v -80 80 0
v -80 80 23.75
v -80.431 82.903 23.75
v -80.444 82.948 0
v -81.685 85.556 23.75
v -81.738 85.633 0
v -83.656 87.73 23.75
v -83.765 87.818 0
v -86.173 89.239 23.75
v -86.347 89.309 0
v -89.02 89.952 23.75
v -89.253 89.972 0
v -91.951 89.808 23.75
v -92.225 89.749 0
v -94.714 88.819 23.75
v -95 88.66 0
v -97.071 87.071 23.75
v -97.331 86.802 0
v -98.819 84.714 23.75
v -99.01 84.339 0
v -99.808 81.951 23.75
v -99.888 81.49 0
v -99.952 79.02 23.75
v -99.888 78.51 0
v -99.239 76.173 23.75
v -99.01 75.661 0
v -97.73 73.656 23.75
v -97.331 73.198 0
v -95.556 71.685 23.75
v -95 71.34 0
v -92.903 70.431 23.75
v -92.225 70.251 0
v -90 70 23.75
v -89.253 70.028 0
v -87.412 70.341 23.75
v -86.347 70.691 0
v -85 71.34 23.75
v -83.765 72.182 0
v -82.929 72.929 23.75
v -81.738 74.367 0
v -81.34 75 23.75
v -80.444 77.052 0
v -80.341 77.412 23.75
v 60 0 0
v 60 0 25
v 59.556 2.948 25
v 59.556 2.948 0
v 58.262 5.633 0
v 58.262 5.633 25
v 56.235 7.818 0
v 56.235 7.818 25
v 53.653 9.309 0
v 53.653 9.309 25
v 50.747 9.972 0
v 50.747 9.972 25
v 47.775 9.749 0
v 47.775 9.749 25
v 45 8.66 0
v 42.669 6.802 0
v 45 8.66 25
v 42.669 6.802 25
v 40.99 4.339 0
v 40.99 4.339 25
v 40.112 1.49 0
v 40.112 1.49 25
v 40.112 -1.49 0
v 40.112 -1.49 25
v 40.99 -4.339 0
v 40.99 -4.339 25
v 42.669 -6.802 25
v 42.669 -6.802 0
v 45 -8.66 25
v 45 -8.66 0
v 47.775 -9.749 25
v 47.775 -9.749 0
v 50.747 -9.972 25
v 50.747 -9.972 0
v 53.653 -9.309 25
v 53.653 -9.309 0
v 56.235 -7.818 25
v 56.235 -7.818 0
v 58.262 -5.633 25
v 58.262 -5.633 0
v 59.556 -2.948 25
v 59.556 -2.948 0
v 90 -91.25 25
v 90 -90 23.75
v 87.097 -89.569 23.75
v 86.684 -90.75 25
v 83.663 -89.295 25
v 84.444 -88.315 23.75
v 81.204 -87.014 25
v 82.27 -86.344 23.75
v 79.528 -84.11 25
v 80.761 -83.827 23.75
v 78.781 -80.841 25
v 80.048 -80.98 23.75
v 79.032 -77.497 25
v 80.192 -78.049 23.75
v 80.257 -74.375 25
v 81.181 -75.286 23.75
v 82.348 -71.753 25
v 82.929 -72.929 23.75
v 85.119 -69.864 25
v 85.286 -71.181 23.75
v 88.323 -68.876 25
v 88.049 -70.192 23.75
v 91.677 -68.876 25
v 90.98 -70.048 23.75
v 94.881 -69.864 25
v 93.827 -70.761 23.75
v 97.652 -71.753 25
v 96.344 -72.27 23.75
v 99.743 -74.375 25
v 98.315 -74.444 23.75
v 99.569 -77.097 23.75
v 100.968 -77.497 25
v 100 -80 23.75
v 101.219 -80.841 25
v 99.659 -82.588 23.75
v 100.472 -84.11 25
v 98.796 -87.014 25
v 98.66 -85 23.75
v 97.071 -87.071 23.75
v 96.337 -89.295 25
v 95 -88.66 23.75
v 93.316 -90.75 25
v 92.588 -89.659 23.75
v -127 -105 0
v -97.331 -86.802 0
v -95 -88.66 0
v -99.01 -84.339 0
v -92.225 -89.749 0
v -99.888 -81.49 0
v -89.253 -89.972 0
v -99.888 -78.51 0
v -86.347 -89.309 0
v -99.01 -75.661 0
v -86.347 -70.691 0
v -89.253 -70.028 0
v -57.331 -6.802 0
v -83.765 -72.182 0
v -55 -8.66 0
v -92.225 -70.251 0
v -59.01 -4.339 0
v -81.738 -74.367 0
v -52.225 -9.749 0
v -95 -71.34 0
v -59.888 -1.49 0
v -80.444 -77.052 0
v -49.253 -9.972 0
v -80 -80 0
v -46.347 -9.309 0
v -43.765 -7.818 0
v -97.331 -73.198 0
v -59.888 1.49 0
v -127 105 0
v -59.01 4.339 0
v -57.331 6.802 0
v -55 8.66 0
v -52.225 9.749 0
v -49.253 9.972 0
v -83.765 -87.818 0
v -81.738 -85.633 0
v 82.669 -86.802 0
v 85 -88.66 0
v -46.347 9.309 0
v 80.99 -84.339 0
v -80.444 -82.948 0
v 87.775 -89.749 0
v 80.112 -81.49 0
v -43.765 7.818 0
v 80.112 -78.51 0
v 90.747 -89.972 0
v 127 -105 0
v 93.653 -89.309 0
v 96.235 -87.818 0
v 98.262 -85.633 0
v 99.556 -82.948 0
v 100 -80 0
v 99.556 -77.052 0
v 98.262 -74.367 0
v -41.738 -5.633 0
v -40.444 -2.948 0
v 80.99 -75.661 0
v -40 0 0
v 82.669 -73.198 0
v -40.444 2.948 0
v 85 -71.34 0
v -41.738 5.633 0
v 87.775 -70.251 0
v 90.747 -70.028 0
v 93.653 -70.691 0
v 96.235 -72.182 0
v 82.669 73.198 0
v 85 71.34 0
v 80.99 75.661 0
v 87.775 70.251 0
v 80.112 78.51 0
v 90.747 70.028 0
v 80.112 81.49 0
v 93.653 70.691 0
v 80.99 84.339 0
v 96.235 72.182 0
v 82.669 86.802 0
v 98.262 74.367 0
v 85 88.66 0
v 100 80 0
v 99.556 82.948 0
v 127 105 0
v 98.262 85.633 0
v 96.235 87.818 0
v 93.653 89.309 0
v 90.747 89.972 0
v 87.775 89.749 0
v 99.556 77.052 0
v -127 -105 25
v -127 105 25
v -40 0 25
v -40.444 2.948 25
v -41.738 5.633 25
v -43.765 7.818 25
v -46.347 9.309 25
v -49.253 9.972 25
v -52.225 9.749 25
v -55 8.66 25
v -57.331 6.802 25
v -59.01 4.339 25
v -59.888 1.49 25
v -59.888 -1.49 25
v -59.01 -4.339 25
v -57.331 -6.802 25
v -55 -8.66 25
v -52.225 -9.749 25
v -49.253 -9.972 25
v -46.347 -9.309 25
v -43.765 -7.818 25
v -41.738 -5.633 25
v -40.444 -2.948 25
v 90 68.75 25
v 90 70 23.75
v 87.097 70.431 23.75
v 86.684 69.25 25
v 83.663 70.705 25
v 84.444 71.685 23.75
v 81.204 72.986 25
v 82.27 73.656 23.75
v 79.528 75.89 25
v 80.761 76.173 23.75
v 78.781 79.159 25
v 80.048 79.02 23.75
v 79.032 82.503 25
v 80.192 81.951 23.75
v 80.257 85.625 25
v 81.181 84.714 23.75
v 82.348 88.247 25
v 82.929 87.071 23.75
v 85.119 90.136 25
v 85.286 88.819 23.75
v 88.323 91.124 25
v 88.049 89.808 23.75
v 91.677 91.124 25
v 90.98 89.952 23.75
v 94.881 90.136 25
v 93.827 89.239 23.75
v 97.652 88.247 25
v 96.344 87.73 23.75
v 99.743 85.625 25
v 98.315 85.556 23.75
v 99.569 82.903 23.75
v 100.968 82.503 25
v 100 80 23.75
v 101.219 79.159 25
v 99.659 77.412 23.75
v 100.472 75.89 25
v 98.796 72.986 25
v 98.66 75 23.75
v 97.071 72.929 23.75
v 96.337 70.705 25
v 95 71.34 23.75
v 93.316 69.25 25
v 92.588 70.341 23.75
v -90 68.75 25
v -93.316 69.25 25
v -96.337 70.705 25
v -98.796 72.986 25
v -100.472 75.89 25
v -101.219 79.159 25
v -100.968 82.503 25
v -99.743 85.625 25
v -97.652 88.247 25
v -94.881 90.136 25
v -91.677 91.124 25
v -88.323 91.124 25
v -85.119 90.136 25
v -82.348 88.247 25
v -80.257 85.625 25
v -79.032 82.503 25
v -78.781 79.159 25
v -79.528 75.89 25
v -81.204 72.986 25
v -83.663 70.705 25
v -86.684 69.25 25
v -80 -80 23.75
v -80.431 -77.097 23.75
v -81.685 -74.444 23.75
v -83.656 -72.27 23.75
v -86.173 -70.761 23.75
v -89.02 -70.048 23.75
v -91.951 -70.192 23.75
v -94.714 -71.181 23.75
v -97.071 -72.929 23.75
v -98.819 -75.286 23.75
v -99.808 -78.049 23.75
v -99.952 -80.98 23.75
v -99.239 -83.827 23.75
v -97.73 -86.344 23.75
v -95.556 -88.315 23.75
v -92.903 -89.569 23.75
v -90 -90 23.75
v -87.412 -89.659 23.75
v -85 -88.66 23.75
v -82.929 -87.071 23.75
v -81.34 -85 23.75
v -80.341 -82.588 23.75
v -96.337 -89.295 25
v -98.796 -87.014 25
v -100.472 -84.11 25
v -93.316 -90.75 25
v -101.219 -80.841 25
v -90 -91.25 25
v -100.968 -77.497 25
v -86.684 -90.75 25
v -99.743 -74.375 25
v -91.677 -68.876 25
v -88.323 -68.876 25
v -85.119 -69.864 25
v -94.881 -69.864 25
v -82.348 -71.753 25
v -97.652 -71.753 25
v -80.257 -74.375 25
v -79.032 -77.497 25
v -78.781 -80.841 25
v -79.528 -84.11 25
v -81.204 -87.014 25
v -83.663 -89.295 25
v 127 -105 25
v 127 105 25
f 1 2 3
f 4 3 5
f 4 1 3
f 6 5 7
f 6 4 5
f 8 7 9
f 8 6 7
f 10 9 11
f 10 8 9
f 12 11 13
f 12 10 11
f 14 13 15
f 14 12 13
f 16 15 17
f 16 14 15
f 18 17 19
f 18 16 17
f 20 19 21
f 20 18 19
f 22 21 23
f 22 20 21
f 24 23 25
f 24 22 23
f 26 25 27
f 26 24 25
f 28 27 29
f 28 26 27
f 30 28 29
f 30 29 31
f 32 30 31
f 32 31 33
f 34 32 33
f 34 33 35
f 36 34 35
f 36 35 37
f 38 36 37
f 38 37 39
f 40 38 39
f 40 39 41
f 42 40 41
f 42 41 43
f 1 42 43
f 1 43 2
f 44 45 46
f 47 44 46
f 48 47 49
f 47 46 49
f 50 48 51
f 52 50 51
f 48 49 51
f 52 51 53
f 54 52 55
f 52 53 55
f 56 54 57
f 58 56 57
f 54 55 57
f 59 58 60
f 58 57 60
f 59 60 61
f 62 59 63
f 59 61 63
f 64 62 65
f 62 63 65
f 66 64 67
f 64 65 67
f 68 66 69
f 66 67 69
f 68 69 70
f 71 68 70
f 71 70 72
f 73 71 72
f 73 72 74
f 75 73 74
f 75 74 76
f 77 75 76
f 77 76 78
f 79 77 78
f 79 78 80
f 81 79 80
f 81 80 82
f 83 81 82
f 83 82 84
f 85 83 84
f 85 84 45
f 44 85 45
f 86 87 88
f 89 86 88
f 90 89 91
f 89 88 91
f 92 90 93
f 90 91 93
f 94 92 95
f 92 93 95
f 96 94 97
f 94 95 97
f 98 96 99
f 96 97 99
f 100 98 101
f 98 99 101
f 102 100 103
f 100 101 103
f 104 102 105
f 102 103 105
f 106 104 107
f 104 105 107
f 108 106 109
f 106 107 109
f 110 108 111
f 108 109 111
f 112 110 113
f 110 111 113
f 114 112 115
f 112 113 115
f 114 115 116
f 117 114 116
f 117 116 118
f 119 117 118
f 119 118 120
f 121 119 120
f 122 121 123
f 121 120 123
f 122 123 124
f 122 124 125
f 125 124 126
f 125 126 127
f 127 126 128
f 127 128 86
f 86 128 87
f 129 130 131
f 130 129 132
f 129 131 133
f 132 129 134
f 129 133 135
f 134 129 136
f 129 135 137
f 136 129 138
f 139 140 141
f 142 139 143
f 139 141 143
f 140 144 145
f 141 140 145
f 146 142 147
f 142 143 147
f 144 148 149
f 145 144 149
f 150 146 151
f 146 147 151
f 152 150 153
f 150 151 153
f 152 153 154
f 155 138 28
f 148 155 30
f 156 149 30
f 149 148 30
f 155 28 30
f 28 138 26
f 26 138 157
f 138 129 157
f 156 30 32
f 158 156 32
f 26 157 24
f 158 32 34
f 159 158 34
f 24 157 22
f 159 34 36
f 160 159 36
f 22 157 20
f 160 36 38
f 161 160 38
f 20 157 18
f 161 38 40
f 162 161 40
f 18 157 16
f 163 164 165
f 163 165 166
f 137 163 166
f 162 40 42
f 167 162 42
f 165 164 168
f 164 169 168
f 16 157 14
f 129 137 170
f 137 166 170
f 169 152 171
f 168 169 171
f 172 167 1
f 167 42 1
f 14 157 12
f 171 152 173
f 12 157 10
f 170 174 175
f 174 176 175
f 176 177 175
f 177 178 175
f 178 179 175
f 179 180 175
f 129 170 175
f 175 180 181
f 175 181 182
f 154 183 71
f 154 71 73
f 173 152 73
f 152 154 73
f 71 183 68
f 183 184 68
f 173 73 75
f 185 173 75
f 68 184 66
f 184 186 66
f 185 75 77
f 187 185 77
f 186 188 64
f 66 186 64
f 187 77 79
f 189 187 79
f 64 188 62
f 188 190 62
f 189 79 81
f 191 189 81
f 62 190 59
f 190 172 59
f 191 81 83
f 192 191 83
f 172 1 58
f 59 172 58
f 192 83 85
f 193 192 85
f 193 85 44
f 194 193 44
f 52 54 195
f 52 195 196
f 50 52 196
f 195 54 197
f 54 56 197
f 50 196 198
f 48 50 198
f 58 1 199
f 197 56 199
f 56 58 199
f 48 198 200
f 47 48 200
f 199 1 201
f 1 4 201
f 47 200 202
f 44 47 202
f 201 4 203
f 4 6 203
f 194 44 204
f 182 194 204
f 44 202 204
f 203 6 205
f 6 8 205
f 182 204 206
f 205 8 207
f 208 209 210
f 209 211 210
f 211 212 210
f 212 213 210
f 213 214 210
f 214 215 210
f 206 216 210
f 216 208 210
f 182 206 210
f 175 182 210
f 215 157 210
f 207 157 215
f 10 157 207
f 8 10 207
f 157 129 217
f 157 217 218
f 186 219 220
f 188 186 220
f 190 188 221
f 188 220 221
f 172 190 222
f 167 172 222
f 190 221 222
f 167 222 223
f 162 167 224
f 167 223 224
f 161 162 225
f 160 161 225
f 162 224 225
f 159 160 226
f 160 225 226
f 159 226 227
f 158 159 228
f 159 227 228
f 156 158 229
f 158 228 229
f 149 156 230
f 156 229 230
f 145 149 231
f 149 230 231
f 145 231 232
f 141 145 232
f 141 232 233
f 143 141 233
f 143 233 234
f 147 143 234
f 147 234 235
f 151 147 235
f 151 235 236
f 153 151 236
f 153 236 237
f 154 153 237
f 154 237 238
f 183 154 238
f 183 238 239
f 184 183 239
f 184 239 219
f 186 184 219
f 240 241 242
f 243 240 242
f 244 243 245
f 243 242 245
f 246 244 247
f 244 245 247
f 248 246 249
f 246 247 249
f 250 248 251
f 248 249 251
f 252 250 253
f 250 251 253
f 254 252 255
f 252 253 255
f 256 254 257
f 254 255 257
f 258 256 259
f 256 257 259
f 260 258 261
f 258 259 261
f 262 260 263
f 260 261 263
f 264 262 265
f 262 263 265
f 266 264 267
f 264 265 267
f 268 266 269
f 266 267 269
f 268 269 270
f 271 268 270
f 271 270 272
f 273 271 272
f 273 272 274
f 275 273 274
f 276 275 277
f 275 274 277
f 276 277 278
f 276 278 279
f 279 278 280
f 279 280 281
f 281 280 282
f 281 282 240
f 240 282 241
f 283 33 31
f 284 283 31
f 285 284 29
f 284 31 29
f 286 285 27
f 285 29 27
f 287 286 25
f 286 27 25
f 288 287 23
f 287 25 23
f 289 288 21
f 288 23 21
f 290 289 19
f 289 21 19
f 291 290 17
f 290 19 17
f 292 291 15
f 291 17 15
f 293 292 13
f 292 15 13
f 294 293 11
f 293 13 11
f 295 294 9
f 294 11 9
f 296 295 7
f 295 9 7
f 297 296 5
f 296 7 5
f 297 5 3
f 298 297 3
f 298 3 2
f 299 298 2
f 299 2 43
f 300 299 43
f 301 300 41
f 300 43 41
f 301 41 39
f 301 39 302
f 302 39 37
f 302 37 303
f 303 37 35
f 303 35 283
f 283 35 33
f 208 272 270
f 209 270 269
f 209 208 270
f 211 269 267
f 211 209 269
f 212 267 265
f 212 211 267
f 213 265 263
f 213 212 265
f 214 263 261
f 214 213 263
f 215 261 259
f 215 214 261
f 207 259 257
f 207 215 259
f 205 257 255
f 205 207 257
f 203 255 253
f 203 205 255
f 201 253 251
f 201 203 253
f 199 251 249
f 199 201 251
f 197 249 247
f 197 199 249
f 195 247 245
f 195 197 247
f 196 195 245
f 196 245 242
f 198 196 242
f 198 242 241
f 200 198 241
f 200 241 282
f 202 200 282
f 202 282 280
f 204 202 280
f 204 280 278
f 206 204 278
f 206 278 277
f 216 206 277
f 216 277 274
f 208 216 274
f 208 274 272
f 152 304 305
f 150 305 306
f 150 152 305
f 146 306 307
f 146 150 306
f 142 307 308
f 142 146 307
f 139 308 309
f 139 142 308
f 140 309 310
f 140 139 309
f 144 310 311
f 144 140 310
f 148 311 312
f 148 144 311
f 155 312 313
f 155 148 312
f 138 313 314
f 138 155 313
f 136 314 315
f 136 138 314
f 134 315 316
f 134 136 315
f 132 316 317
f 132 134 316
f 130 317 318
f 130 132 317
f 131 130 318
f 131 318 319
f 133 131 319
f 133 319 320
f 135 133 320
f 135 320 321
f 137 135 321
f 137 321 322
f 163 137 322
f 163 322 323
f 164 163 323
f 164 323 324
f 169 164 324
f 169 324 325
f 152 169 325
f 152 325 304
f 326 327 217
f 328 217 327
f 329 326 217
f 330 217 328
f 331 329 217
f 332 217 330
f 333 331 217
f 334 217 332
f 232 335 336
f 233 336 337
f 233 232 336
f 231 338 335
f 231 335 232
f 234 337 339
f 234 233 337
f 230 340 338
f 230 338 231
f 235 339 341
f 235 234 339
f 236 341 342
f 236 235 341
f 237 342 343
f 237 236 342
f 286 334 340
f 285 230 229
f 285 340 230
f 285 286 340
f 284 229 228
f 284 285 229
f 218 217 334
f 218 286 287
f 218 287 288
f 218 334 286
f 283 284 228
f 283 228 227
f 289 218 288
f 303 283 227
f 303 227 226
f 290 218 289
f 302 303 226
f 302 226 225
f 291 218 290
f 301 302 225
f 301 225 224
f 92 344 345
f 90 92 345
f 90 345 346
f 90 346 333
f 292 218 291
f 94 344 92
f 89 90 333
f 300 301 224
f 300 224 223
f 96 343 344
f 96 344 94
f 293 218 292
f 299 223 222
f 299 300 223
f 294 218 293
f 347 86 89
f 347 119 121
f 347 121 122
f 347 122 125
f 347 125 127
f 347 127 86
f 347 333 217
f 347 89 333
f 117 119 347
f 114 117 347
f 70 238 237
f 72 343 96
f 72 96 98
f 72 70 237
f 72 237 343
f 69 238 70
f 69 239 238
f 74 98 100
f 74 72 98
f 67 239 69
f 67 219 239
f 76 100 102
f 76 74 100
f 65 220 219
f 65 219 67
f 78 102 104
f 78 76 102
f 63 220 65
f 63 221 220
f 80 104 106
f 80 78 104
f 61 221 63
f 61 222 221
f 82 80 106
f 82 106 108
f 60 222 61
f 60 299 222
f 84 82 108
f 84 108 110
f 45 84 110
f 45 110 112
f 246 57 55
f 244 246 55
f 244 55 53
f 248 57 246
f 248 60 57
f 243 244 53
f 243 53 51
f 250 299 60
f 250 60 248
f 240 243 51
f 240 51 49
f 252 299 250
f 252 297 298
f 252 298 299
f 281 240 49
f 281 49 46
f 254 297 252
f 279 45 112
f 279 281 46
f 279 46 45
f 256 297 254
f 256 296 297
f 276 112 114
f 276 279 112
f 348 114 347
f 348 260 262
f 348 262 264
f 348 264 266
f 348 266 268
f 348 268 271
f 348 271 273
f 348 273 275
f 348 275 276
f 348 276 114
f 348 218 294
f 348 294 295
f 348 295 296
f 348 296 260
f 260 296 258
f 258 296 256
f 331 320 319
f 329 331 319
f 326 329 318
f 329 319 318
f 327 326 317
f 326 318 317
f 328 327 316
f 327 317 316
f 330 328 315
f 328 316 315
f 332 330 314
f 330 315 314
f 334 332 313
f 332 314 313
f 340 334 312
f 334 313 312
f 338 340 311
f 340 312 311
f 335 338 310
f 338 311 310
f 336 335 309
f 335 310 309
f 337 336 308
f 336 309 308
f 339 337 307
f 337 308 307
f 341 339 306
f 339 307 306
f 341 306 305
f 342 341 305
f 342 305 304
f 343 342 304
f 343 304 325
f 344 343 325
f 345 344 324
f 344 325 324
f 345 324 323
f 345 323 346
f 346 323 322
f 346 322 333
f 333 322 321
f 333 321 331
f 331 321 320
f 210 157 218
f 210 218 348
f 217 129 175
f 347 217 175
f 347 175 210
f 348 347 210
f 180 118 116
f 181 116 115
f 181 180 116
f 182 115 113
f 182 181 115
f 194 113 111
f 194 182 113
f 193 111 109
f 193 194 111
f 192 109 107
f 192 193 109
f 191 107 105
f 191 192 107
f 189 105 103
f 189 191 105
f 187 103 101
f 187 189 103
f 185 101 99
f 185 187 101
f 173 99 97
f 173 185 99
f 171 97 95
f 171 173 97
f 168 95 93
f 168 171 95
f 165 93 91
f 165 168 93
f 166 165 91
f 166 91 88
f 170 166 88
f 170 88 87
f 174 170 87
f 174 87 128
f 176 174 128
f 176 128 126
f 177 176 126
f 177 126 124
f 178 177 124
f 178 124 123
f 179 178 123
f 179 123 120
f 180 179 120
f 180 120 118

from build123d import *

# Parameters (mm, degrees)
SKETCH1_W           = 254
SKETCH1_H           = 210
SKETCH1_R           = 10
BOSS_EXTRUDE1_DEPTH = 25
CUT_EXTRUDE1_REACH  = 168.67
SKETCH2_R           = 10


with BuildPart() as part:
    # Sketch1 → Boss-Extrude1 (new body)
    with BuildSketch(Plane.XY):
        Rectangle(SKETCH1_W, SKETCH1_H)
        with Locations((-90, 80)):
            Circle(SKETCH1_R, mode=Mode.SUBTRACT)
        with Locations((90, 80)):
            Circle(SKETCH1_R, mode=Mode.SUBTRACT)
        with Locations((90, -80)):
            Circle(SKETCH1_R, mode=Mode.SUBTRACT)
        with Locations((-90, -80)):
            Circle(SKETCH1_R, mode=Mode.SUBTRACT)
    extrude(amount=BOSS_EXTRUDE1_DEPTH)

    # Sketch2 → Cut-Extrude1 (cut, up to next)
    with BuildSketch(Plane.XY.offset(25), mode=Mode.PRIVATE) as cut_extrude1_sk1:
        with Locations((-50, 0)):
            Circle(SKETCH2_R)
    cut_extrude1_tool1 = extrude(cut_extrude1_sk1.sketch, amount=-CUT_EXTRUDE1_REACH, mode=Mode.PRIVATE) & part.part
    # Sketch2 → Cut-Extrude1 (cut, up to next)
    with BuildSketch(Plane.XY.offset(25), mode=Mode.PRIVATE) as cut_extrude1_sk2:
        with Locations((50, 0)):
            Circle(SKETCH2_R)
    cut_extrude1_tool2 = extrude(cut_extrude1_sk2.sketch, amount=-CUT_EXTRUDE1_REACH, mode=Mode.PRIVATE) & part.part
    add(cut_extrude1_tool1.solids().sort_by_distance((-50, 0, 25))[0], mode=Mode.SUBTRACT)
    add(cut_extrude1_tool2.solids().sort_by_distance((50, 0, 25))[0], mode=Mode.SUBTRACT)

    # Cut-Extrude2 cone 1 section (through the dimple's axis) → Cut-Extrude2 (revolve, cut)
    with BuildSketch(Plane(origin=(-90, 80, 25), x_dir=(0, -1, 0), z_dir=(1, 0, 0))):
        Polygon((0, 0), (11.25, 0), (0, 11.25), align=None)
    revolve(axis=Axis((-90, 80, 25), (0, 0, -1)), mode=Mode.SUBTRACT)

    # Cut-Extrude2 cone 2 section (through the dimple's axis) → Cut-Extrude2 cone 2 (revolve, cut)
    with BuildSketch(Plane(origin=(90, 80, 25), x_dir=(0, -1, 0), z_dir=(1, 0, 0))):
        Polygon((0, 0), (11.25, 0), (0, 11.25), align=None)
    revolve(axis=Axis((90, 80, 25), (0, 0, -1)), mode=Mode.SUBTRACT)

    # Cut-Extrude2 cone 3 section (through the dimple's axis) → Cut-Extrude2 cone 3 (revolve, cut)
    with BuildSketch(Plane(origin=(90, -80, 25), x_dir=(0, -1, 0), z_dir=(1, 0, 0))):
        Polygon((0, 0), (11.25, 0), (0, 11.25), align=None)
    revolve(axis=Axis((90, -80, 25), (0, 0, -1)), mode=Mode.SUBTRACT)

    # Cut-Extrude2 cone 4 section (through the dimple's axis) → Cut-Extrude2 cone 4 (revolve, cut)
    with BuildSketch(Plane(origin=(-90, -80, 25), x_dir=(0, -1, 0), z_dir=(1, 0, 0))):
        Polygon((0, 0), (11.25, 0), (0, 11.25), align=None)
    revolve(axis=Axis((-90, -80, 25), (0, 0, -1)), mode=Mode.SUBTRACT)


solid = part.part
